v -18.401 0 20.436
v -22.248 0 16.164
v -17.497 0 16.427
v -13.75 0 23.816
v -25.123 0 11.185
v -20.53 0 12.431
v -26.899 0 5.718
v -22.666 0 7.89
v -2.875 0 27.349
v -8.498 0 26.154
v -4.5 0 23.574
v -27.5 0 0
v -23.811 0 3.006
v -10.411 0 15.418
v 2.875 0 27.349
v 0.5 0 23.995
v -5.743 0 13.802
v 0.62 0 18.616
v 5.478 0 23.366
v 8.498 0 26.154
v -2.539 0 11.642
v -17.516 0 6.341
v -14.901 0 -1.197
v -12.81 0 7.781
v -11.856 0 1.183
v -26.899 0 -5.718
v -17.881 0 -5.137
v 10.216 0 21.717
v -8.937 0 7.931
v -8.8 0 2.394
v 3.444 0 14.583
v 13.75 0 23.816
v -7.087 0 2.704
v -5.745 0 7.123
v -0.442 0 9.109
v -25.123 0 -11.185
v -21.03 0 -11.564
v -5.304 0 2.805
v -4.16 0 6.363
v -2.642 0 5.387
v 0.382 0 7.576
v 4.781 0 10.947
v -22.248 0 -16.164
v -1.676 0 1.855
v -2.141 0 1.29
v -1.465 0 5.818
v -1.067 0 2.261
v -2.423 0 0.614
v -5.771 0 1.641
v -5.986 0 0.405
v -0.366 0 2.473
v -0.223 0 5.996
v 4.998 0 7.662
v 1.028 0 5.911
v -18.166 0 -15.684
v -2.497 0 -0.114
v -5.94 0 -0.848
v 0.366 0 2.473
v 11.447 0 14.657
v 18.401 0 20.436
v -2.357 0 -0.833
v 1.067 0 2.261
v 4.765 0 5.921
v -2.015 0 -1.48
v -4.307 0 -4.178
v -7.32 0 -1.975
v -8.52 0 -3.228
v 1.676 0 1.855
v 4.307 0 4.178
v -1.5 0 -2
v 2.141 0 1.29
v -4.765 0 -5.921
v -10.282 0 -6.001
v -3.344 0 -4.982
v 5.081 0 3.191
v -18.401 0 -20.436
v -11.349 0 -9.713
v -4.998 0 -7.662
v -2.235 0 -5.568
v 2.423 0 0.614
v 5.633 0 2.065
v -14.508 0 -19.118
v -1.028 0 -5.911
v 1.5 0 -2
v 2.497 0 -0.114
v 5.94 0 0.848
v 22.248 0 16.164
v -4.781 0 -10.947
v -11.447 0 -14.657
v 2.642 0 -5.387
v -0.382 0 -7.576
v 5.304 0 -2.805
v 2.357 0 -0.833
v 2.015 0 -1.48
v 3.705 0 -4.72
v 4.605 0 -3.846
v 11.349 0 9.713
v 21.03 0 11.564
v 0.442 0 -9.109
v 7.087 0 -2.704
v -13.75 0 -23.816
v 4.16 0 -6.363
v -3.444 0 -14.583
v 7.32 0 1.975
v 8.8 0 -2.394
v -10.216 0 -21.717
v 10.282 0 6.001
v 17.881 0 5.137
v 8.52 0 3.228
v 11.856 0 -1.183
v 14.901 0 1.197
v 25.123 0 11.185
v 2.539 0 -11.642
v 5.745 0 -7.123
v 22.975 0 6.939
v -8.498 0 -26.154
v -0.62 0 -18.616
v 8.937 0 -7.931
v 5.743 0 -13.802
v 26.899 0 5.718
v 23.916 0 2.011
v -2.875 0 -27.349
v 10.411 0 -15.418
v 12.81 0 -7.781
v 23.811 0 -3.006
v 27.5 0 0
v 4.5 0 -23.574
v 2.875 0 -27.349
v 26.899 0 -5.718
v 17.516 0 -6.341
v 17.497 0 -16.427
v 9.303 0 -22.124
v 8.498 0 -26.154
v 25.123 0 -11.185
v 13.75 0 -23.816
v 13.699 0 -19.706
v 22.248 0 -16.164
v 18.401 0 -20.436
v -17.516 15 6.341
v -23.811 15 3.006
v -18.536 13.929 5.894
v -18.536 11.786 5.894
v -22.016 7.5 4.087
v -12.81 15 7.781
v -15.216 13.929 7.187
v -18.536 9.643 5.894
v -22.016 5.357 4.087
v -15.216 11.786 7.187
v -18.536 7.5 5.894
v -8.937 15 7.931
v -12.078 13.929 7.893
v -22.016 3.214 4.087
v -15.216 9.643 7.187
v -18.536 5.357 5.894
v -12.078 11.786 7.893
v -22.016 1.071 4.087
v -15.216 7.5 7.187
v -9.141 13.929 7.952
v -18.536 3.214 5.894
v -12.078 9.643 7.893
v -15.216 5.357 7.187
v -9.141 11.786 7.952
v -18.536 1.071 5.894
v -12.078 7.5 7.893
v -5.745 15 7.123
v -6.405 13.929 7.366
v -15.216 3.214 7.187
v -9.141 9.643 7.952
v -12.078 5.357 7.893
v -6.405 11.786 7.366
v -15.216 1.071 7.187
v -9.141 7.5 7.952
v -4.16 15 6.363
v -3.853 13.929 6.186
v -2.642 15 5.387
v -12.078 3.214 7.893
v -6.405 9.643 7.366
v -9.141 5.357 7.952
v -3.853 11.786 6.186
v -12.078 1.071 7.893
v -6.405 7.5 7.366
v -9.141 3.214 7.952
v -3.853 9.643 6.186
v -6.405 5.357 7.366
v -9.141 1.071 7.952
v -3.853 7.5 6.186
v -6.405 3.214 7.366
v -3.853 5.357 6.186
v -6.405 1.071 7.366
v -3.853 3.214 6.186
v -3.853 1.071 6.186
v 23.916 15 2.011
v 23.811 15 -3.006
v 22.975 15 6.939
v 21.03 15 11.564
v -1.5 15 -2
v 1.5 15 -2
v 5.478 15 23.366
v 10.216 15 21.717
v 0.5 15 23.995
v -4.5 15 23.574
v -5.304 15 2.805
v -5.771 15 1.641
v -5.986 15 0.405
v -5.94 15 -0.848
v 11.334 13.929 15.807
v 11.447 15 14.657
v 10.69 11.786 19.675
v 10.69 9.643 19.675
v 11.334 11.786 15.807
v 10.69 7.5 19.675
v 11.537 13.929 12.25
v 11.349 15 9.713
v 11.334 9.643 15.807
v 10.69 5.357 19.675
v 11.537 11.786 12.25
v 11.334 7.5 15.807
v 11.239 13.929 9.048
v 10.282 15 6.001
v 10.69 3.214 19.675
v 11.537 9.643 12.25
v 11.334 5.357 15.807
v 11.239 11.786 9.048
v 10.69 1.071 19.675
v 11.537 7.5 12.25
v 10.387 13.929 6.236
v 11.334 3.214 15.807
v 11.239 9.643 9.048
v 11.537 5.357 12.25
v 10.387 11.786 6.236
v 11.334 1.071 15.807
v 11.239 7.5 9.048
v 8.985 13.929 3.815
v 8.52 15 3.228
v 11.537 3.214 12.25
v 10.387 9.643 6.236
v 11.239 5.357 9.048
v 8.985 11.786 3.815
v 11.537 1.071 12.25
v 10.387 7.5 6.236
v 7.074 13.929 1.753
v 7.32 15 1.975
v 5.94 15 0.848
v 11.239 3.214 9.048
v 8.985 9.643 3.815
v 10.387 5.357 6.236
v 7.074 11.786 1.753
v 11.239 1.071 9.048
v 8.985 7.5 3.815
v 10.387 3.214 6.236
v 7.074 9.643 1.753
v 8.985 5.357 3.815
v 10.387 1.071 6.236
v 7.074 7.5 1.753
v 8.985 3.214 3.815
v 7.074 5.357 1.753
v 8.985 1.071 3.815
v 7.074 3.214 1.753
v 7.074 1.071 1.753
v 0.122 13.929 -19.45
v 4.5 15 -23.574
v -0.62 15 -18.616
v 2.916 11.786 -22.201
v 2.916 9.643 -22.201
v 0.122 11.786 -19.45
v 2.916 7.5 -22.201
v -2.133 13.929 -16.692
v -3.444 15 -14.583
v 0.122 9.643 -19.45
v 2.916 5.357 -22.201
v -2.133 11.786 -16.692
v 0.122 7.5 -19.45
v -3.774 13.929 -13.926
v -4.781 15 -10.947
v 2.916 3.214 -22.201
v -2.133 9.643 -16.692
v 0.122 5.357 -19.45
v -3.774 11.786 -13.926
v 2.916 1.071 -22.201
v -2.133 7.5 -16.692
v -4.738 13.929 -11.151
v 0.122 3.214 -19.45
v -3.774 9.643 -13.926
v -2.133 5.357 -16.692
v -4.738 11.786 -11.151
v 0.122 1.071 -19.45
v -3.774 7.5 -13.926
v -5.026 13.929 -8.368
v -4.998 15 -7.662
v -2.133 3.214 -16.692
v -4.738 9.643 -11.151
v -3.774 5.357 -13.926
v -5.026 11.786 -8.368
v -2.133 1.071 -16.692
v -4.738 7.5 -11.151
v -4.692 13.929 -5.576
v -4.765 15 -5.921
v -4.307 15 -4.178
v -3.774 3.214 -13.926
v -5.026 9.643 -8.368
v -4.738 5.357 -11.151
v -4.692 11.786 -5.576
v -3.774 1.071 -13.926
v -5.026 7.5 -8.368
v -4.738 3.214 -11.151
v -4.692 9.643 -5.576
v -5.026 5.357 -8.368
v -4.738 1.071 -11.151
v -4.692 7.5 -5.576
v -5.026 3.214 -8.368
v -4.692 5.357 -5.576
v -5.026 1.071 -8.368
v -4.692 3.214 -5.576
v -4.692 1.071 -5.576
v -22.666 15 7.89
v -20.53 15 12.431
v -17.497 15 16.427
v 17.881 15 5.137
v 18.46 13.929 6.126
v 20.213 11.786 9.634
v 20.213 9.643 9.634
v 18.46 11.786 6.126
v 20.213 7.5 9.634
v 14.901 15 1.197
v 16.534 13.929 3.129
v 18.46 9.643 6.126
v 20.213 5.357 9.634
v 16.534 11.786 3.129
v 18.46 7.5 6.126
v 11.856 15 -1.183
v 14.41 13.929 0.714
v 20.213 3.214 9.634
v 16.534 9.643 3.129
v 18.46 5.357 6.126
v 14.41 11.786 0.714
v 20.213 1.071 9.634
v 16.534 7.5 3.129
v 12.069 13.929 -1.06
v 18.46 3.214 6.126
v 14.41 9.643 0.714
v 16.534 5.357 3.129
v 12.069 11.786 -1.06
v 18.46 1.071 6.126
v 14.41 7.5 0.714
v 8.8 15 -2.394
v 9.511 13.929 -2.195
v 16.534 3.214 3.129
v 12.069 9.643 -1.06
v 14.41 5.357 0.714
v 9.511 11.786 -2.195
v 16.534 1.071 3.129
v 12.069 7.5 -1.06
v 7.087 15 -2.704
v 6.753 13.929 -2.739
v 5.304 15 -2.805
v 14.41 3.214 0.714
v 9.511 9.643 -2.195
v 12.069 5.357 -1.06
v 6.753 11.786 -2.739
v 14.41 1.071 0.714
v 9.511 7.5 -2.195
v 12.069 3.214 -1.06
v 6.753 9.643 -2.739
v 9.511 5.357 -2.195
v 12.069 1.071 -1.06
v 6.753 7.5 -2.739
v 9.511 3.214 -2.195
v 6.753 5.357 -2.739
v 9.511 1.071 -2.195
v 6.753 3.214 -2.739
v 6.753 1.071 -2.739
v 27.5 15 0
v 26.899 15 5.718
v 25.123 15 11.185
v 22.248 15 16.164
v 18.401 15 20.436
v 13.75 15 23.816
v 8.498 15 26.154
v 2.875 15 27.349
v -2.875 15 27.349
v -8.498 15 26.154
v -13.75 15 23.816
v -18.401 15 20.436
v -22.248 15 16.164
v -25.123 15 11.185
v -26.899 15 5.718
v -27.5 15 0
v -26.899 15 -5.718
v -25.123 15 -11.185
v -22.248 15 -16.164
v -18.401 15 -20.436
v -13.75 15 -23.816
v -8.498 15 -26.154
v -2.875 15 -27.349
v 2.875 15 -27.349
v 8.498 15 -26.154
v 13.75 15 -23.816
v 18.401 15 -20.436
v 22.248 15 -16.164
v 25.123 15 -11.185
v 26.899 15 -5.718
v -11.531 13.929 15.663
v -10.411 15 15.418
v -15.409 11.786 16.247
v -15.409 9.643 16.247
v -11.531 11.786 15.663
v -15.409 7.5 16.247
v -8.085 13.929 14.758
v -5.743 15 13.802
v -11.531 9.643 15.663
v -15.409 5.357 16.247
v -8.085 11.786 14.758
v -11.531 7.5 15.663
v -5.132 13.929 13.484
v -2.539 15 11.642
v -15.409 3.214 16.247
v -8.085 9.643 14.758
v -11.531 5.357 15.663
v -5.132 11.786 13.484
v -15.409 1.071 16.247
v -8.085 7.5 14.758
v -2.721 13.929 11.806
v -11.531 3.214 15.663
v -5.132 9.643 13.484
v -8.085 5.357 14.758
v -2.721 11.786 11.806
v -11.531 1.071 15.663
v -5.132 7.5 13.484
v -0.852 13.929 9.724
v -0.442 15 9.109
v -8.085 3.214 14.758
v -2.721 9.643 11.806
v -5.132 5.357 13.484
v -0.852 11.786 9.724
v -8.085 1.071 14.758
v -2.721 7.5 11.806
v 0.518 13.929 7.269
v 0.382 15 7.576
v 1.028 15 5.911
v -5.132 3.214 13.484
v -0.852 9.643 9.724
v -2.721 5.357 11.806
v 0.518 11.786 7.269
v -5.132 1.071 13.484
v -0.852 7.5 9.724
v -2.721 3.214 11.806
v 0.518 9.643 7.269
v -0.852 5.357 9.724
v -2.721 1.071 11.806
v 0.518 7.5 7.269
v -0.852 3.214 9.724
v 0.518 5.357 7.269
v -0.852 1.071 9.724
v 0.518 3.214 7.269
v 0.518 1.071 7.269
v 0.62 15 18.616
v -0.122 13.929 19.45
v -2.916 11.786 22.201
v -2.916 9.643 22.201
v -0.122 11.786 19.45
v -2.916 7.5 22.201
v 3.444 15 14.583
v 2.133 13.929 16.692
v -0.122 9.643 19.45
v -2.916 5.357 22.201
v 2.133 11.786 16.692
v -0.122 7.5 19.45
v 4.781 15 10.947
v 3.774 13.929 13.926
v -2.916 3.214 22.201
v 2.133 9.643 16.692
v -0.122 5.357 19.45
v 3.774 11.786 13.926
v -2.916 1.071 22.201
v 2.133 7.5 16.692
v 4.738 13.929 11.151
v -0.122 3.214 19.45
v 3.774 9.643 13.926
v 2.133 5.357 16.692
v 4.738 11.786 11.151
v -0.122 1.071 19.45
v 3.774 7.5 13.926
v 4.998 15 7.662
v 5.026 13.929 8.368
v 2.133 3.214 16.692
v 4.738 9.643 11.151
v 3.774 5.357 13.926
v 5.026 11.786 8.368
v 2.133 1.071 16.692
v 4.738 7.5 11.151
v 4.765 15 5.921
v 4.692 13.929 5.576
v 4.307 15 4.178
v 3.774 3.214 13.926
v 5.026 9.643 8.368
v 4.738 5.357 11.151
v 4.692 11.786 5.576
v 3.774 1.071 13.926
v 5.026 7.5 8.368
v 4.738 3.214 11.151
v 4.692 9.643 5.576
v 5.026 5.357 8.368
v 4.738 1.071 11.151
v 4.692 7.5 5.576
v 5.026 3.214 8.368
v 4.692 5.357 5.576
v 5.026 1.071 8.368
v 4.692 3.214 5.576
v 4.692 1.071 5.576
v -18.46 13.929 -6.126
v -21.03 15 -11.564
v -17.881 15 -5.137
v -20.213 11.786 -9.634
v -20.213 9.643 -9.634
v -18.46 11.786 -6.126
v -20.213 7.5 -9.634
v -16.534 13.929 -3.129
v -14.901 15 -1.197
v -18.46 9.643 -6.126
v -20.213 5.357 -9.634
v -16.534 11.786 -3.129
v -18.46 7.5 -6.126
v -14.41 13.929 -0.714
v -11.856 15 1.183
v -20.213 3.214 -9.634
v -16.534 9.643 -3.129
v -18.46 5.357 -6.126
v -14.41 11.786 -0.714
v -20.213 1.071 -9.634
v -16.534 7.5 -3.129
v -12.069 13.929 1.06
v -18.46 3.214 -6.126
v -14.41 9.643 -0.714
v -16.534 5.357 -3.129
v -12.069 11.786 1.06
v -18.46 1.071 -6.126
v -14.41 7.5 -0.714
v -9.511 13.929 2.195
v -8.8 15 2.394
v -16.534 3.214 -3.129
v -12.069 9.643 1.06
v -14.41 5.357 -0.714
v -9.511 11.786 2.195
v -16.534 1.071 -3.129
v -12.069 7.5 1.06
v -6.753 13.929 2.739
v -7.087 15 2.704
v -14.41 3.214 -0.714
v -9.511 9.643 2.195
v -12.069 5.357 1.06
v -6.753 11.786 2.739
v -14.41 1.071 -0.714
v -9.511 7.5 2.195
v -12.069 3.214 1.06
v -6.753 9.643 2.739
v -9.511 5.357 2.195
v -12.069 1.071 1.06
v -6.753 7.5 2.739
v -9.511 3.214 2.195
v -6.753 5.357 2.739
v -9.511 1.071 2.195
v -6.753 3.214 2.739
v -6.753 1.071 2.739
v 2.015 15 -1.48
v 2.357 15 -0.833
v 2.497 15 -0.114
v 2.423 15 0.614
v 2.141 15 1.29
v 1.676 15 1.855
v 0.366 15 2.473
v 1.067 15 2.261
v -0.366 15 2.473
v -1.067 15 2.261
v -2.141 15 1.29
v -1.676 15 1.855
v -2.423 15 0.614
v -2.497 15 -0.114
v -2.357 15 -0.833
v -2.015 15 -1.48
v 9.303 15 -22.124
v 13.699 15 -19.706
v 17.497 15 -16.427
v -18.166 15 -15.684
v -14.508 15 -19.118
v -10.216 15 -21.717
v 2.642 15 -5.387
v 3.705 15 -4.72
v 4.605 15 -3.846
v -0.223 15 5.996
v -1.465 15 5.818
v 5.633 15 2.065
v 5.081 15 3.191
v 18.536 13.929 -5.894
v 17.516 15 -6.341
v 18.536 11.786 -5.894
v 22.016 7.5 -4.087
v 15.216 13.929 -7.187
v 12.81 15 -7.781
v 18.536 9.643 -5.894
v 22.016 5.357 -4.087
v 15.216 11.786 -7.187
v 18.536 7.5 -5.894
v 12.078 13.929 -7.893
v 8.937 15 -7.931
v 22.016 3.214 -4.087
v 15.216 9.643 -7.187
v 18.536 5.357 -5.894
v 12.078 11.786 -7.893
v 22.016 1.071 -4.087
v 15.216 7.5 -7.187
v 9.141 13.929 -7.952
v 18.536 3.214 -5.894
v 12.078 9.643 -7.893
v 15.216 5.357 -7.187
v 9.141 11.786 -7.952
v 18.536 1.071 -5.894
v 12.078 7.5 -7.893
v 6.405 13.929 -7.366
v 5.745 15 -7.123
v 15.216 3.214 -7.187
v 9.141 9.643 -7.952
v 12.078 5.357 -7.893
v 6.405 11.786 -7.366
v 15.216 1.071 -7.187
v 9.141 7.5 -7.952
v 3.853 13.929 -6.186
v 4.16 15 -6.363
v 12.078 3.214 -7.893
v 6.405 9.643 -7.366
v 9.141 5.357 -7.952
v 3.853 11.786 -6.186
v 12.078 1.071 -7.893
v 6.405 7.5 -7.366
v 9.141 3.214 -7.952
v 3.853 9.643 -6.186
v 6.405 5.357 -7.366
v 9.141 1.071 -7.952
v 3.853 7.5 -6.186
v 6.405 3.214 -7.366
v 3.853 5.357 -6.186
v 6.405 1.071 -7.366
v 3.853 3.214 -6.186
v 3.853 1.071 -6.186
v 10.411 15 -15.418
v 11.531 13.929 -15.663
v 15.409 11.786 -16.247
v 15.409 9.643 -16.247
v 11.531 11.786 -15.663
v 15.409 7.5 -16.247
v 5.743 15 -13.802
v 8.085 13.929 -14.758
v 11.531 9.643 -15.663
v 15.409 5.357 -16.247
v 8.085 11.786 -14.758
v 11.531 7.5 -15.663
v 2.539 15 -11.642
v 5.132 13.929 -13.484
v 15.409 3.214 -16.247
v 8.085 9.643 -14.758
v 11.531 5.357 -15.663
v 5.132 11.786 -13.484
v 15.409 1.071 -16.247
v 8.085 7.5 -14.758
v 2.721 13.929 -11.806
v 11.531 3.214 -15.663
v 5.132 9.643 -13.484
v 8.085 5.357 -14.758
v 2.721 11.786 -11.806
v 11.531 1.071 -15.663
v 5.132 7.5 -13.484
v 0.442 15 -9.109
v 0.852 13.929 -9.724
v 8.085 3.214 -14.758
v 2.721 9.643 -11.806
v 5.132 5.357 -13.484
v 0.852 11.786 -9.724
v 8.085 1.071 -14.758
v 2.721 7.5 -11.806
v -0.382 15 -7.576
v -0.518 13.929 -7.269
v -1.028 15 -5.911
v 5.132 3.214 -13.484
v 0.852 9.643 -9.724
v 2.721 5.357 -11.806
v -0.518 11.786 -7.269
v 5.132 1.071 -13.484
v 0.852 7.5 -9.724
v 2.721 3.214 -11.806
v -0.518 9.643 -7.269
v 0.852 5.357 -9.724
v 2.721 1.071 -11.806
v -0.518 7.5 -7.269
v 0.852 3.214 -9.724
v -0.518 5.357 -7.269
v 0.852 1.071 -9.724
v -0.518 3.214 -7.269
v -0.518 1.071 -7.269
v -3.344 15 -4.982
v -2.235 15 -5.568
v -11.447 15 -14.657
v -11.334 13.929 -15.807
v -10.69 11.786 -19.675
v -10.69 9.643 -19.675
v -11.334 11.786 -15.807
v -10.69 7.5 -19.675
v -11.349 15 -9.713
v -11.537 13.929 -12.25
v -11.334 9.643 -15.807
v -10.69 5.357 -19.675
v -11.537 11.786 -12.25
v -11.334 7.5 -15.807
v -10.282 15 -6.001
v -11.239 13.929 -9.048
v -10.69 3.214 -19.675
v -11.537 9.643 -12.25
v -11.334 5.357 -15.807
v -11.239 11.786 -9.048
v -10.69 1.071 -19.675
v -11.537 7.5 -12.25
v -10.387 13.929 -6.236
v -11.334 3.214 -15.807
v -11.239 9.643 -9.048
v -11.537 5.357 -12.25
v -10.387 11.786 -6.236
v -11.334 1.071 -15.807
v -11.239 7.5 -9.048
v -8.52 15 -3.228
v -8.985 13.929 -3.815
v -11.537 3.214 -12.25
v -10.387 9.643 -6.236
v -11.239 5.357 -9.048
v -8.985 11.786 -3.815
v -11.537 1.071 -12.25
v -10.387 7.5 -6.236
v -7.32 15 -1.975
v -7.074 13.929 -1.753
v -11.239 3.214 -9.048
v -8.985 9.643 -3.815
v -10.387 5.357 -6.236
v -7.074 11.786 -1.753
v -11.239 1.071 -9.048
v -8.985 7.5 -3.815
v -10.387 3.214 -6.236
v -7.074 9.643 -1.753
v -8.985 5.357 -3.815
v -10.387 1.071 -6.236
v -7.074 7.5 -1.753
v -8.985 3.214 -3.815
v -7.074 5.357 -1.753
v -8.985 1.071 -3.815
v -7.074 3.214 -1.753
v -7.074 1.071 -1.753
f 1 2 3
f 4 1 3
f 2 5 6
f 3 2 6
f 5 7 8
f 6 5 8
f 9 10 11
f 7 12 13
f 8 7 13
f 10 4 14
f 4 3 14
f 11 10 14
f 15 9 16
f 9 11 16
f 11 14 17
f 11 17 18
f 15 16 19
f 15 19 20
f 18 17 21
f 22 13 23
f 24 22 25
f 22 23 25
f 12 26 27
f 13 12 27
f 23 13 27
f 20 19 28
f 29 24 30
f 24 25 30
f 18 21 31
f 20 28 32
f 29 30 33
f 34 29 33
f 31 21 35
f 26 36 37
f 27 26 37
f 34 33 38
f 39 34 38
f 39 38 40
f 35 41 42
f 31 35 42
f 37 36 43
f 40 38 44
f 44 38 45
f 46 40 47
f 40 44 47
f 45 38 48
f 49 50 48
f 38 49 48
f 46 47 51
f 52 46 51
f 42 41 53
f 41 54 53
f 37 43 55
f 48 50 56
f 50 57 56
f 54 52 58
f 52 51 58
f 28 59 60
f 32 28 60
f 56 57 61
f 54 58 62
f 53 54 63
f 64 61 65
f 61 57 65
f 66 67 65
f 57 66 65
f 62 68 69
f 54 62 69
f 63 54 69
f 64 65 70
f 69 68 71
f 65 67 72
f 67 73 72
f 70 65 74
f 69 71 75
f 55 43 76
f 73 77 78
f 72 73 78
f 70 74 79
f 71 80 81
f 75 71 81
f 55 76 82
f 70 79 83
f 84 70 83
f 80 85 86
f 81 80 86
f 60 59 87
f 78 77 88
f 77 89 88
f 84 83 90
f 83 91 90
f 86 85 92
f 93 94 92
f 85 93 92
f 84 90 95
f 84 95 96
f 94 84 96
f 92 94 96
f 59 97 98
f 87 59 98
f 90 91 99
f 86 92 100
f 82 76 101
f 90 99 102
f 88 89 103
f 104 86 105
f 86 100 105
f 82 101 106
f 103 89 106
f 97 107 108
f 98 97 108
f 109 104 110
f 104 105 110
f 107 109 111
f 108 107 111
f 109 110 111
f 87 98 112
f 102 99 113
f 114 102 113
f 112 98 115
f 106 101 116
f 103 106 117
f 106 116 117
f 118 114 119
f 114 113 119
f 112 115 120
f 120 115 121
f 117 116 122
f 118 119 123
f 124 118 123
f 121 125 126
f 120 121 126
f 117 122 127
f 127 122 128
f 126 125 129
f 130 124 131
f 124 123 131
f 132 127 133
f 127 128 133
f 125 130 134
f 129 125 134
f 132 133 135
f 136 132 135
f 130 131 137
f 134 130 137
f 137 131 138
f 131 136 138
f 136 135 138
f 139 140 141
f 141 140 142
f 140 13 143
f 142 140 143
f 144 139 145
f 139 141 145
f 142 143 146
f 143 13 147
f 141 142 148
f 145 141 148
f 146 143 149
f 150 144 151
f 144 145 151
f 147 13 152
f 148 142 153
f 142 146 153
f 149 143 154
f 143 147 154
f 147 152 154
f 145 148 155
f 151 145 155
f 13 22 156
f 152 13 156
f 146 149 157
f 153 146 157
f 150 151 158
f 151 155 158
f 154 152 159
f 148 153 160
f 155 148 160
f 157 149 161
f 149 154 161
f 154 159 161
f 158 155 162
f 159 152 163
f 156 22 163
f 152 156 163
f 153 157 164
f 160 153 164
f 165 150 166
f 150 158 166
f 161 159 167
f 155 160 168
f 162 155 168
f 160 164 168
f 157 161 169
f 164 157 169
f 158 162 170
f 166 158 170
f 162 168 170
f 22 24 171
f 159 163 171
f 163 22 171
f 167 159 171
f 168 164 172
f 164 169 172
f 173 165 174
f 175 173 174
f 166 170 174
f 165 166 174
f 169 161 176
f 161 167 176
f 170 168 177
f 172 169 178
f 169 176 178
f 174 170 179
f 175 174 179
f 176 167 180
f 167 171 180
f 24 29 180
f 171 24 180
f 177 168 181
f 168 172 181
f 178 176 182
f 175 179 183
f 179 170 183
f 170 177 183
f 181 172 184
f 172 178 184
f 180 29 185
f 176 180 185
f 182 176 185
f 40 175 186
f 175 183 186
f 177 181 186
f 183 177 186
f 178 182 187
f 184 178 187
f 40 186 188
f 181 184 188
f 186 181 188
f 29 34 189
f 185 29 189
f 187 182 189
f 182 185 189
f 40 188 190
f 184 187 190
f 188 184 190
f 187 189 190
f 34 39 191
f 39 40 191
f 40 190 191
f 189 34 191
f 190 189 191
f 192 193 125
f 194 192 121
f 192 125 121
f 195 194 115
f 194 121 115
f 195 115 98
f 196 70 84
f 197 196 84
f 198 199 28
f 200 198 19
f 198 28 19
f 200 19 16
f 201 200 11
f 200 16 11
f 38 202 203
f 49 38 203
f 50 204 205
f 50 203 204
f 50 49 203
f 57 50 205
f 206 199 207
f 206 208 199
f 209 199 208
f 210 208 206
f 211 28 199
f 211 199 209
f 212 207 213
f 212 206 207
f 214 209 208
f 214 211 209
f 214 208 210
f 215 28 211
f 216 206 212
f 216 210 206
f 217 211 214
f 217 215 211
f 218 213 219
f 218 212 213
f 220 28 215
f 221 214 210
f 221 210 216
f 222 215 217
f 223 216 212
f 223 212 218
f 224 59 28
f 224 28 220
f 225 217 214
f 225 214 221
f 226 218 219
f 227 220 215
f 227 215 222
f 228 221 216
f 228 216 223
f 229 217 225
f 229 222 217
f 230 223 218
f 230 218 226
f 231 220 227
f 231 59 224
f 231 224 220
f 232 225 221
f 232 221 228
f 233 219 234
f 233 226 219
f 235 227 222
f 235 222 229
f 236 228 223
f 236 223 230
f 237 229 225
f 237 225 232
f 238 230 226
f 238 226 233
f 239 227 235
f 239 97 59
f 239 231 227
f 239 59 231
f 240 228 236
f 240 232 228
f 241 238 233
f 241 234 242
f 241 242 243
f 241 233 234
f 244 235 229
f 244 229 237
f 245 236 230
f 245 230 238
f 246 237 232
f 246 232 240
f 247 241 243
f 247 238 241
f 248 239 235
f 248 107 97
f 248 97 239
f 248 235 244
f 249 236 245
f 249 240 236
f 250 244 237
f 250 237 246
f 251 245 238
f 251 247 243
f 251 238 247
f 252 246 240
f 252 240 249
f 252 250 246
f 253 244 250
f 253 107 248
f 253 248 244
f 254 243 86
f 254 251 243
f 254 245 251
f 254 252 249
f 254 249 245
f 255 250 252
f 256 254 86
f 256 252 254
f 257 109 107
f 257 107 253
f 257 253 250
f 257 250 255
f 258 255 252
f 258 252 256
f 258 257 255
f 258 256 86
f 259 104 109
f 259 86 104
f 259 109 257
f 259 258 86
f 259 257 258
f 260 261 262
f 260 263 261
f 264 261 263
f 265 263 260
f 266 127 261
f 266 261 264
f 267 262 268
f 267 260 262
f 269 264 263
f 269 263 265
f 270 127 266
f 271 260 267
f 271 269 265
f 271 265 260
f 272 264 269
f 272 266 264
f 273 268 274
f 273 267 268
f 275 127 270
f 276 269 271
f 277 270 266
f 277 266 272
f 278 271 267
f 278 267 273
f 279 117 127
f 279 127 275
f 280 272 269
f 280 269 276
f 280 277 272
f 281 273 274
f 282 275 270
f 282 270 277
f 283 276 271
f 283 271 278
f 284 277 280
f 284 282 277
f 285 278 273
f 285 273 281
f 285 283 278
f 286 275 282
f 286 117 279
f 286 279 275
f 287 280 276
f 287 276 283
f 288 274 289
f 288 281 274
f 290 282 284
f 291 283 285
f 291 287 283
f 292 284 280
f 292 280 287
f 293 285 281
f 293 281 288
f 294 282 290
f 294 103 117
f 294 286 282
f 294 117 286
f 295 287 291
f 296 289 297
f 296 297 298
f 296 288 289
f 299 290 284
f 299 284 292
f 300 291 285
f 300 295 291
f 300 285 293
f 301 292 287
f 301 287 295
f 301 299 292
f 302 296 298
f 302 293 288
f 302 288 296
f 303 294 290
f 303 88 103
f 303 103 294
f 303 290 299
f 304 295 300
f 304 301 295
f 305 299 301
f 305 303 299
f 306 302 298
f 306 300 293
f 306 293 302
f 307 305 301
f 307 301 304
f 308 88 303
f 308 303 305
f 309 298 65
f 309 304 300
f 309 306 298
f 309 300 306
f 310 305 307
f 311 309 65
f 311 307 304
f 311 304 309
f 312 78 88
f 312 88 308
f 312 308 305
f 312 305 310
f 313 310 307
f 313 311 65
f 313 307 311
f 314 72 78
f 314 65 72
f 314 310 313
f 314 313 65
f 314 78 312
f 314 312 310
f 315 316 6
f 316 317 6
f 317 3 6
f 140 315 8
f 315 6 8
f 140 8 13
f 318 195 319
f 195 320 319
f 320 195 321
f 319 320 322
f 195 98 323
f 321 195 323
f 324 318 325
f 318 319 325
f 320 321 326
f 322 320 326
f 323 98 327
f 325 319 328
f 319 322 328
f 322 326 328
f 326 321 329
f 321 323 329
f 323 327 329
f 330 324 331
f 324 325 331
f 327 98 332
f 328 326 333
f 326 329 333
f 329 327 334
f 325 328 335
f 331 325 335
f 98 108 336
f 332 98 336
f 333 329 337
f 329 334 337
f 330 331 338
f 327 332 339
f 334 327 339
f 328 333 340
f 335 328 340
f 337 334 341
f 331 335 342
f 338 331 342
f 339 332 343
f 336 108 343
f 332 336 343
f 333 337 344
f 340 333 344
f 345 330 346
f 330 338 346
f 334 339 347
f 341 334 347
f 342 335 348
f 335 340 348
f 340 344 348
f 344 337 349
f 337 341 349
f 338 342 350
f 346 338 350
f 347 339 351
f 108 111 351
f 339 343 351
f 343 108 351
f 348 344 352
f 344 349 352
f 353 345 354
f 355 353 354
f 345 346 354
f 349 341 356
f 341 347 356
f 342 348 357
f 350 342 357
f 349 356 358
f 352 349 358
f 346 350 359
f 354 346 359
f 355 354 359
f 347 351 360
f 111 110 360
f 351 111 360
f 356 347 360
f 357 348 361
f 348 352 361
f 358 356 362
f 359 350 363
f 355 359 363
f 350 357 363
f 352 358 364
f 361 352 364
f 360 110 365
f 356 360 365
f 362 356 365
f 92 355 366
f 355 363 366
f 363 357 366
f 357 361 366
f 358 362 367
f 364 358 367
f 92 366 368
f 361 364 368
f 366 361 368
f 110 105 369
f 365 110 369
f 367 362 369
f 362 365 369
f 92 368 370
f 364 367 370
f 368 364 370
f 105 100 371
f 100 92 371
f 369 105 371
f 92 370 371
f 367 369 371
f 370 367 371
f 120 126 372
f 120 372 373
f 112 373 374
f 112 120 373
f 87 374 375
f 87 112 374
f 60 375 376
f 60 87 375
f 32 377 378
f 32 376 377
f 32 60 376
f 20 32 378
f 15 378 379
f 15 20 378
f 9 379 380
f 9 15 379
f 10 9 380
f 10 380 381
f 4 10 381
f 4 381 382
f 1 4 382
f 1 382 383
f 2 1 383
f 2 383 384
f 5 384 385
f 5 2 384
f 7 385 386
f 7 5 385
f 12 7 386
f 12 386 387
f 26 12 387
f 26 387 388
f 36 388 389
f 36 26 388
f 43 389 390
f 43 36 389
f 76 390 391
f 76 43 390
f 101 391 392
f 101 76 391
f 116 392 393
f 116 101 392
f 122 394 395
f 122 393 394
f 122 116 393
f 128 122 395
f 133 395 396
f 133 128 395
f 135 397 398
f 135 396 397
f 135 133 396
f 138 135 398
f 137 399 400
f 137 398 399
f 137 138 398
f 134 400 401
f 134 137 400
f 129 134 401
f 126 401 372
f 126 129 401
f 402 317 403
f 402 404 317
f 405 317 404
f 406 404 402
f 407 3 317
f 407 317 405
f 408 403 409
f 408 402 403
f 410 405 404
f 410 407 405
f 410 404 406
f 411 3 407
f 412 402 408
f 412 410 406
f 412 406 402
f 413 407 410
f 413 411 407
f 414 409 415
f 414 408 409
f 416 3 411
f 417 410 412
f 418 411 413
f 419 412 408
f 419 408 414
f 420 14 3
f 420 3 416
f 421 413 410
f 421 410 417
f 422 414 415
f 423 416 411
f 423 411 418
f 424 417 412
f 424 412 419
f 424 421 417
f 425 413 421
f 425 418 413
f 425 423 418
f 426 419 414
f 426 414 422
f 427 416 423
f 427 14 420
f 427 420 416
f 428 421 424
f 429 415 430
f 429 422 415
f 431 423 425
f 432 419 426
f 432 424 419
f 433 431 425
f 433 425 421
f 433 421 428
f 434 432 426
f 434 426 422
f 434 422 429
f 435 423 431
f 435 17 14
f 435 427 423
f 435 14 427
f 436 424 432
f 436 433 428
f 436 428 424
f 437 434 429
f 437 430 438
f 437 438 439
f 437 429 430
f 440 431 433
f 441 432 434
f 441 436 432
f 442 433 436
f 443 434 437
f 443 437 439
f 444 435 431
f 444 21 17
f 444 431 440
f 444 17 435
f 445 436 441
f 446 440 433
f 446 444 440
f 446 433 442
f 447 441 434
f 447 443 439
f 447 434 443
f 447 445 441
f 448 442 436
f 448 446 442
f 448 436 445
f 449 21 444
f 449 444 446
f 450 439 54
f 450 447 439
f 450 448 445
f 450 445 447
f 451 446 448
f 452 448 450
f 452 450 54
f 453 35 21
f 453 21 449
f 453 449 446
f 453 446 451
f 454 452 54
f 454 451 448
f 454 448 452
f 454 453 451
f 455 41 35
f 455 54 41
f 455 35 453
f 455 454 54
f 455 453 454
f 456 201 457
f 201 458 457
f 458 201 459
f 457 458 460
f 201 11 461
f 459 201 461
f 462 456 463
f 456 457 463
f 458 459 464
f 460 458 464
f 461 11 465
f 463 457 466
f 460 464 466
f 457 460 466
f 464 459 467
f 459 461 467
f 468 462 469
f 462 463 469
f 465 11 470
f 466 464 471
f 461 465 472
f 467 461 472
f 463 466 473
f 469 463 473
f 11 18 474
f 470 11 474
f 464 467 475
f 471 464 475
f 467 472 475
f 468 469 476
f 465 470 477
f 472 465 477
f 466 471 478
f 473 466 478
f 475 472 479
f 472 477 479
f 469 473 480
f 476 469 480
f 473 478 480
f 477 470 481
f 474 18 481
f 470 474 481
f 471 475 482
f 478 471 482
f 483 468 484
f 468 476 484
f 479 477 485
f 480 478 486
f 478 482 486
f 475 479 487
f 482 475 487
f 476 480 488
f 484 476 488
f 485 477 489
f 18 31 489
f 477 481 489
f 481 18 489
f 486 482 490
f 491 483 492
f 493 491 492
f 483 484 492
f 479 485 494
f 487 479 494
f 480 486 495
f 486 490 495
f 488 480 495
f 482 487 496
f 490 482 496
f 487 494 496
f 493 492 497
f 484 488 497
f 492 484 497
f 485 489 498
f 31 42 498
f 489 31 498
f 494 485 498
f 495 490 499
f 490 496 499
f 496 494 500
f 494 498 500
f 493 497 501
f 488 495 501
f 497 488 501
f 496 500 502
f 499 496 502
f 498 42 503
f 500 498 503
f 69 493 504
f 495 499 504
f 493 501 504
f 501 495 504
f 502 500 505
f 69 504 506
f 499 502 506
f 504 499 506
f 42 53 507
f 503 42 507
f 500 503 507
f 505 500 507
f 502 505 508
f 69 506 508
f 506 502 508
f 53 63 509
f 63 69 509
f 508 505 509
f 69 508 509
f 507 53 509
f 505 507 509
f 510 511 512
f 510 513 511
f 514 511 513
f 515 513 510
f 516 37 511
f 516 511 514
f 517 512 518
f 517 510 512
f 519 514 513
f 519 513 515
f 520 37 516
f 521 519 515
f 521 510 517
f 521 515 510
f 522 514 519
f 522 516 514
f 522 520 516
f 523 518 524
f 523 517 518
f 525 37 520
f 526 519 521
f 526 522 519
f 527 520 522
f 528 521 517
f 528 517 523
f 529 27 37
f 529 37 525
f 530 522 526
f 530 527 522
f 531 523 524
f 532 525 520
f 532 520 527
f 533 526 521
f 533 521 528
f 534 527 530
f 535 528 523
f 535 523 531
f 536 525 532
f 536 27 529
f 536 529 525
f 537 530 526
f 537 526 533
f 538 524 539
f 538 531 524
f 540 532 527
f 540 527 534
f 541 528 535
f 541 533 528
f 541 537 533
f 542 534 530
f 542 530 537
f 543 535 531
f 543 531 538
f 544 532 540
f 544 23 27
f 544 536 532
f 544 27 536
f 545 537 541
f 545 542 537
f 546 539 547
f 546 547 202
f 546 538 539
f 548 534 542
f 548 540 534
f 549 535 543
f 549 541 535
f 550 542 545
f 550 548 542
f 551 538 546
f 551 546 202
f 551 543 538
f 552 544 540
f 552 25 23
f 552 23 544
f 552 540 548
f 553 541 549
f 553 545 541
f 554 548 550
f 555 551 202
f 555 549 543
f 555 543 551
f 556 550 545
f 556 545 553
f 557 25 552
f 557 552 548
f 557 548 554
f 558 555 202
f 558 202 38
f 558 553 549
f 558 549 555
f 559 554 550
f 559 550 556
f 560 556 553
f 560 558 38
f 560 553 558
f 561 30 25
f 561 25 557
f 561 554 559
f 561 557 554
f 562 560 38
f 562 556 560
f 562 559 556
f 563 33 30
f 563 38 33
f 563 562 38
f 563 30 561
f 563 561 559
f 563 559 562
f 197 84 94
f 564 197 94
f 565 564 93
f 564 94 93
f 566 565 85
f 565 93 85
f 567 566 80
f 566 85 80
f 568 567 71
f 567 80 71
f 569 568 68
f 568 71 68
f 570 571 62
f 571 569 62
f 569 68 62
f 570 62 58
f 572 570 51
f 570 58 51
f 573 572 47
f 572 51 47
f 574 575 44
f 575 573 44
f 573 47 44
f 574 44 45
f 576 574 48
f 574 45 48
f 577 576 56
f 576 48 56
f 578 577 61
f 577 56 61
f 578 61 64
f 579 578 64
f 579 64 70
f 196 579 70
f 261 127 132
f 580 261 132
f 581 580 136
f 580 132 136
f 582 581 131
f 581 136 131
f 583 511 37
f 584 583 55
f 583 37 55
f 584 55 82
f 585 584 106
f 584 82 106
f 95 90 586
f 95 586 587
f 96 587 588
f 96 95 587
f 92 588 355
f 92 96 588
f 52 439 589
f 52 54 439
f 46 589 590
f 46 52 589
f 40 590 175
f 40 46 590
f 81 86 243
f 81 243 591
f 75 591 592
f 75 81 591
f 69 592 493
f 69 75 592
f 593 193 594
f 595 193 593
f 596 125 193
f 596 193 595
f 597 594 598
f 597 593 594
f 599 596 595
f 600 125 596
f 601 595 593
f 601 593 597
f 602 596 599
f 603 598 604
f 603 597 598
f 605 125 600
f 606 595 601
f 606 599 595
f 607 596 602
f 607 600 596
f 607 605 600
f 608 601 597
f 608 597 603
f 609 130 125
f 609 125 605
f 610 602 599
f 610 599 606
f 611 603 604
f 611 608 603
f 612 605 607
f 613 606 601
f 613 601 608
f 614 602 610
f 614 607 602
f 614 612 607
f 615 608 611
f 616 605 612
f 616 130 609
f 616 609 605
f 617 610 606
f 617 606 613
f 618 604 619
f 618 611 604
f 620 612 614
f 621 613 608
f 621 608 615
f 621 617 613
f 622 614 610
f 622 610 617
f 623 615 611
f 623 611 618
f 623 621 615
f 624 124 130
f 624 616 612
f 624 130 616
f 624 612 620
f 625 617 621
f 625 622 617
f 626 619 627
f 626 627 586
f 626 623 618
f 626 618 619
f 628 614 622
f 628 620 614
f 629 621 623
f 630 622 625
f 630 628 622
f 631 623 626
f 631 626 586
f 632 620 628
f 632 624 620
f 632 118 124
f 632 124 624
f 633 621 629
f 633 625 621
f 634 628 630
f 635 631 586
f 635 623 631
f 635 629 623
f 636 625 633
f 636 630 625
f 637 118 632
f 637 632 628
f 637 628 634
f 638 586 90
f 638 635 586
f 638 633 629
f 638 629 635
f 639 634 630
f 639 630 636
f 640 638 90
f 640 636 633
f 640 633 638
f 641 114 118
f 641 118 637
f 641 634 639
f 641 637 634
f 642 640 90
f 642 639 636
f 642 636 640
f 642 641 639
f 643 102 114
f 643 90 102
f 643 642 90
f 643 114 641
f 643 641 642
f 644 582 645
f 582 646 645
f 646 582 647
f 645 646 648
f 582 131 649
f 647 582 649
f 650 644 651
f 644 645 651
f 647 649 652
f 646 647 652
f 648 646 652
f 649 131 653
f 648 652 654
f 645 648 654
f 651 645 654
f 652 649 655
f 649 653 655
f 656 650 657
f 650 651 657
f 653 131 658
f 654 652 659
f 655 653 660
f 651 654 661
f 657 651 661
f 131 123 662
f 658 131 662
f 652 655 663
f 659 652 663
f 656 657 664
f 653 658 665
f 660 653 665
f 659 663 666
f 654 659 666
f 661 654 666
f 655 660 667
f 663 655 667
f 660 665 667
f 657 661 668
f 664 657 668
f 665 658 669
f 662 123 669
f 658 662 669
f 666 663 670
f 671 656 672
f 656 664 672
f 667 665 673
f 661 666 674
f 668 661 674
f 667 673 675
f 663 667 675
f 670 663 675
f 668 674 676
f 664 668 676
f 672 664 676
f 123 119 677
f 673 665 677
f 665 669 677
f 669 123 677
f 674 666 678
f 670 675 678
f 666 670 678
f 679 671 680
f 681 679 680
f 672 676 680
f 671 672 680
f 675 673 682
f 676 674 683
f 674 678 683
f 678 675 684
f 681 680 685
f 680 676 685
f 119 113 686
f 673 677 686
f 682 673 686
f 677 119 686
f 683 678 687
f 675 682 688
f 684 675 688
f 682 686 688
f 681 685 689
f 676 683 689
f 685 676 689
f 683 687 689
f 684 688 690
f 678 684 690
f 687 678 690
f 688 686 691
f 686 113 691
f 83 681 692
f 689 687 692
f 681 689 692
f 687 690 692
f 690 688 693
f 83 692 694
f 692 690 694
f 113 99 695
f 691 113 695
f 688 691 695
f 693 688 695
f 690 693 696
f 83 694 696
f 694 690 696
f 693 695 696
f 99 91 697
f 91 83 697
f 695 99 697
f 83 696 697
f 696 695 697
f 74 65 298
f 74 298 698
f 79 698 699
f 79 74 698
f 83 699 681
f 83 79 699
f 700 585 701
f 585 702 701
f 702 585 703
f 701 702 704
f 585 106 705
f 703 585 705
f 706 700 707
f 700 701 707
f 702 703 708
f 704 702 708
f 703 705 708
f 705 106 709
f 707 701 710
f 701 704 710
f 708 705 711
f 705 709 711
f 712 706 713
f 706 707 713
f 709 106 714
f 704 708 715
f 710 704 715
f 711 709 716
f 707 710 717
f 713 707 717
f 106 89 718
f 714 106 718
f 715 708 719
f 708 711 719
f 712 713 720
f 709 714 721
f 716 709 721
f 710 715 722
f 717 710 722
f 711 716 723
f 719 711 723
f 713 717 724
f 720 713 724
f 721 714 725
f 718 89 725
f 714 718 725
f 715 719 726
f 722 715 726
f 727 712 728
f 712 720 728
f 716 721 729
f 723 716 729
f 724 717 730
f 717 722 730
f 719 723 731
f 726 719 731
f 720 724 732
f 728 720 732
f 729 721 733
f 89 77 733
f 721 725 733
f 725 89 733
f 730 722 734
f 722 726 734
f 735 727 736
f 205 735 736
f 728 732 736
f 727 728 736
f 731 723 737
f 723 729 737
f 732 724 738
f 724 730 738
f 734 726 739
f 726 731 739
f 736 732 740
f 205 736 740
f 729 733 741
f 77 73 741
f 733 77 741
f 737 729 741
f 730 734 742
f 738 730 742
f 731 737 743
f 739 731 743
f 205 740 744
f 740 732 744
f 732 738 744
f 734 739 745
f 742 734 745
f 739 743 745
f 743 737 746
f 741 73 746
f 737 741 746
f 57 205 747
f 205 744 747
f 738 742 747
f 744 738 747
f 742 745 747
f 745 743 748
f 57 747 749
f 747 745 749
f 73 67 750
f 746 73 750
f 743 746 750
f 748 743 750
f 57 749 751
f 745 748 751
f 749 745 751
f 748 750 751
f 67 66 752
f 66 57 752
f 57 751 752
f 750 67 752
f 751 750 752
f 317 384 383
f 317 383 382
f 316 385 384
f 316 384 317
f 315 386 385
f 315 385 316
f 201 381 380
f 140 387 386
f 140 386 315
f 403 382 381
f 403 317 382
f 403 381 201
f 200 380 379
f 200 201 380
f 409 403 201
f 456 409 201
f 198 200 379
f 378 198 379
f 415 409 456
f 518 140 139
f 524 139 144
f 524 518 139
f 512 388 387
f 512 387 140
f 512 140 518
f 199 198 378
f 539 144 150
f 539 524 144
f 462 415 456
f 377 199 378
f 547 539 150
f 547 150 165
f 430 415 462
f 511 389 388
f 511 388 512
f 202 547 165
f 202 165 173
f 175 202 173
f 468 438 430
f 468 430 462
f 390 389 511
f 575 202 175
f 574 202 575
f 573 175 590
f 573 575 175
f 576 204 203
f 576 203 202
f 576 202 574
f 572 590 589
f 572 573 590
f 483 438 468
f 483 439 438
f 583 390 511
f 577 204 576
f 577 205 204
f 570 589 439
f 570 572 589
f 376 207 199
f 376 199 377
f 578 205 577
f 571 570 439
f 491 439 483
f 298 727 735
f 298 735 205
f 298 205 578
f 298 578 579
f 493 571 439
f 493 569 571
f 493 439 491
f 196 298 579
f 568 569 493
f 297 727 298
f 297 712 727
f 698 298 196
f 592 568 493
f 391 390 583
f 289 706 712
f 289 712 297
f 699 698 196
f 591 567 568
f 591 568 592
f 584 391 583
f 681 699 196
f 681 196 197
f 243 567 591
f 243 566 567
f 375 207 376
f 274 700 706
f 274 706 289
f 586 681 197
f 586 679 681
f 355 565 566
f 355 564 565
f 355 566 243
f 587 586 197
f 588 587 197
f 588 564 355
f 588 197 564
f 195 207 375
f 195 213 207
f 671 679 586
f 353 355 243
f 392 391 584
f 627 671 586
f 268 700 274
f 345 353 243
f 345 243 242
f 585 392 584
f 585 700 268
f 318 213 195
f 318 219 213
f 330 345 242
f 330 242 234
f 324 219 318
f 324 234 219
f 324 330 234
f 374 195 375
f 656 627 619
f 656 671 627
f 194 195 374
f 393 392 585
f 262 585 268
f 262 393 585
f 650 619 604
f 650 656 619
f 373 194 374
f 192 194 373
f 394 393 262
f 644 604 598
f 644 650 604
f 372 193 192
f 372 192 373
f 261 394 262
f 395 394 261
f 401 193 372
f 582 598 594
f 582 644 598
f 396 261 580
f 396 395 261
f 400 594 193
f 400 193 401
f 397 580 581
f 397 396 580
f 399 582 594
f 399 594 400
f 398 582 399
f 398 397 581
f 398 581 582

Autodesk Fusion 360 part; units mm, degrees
sketch "Sketch1" plane through (0, 0, 0) normal (0, 1, 0) x (1, 0, 0)
  circle A0 centre (0, 0) radius 2.5
  circle A1 centre (0, 0) radius 27.5
  circle A2 centre (0, 0) radius 6
  circle A3 centre (0, 0) radius 24
  line L0 (0, 0) -> (0, 2.5)
  line L1 (-1.5, 2) -> (1.5, 2)
  line L2 (1.5, 2) -> (1.5, -2)
  line L3 (1.5, -2) -> (-1.5, -2)
  line L4 (-1.5, -2) -> (-1.5, 2)
  line L5 (0, 0) -> (0, -2.5)
  spline S0 degree 5 poles (-10.2165, 21.7169) (-10.3629, 21.1355) (-10.6365, 19.9863) (-10.9889, 18.3035) (-11.3409, 16.1432) (-11.5701, 13.5918) (-11.567, 11.2048) (-11.3076, 8.9989) (-10.7716, 6.9887) (-9.9564, 5.1759) (-8.8773, 3.5497) (-7.8173, 2.3879) (-6.9183, 1.5901) (-6.2735, 1.0903) (-5.9397, 0.8485) knots 0 0 0 0 0 0 0.1 0.2 0.3 0.4 0.5 0.6 0.7 0.8 0.9 1 1 1 1 1 1
  spline S1 degree 5 poles (-21.0302, 11.5643) (-20.8069, 11.0078) (-20.3528, 9.9173) (-19.6488, 8.3487) (-18.6637, 6.3941) (-17.3495, 4.1953) (-15.9439, 2.2659) (-14.4375, 0.6338) (-12.8223, -0.6775) (-11.0972, -1.6649) (-9.2683, -2.3461) (-7.7279, -2.6631) (-6.5316, -2.7801) (-5.7162, -2.8054) (-5.3041, -2.8048) knots 0 0 0 0 0 0 0.1 0.2 0.3 0.4 0.5 0.6 0.7 0.8 0.9 1 1 1 1 1 1
  spline S2 degree 5 poles (-23.8111, -3.0055) (-23.3034, -3.3245) (-22.295, -3.9398) (-20.8034, -4.795) (-18.8576, -5.7973) (-16.502, -6.8037) (-14.2308, -7.5384) (-12.0527, -7.9734) (-9.9752, -8.0848) (-7.9993, -7.8697) (-6.1192, -7.3459) (-4.6867, -6.6968) (-3.6501, -6.0883) (-2.9756, -5.6295) (-2.6425, -5.3868) knots 0 0 0 0 0 0 0.1 0.2 0.3 0.4 0.5 0.6 0.7 0.8 0.9 1 1 1 1 1 1
  spline S3 degree 5 poles (-17.4969, -16.4273) (-16.8987, -16.3869) (-15.7212, -16.292) (-14.0119, -16.1072) (-11.8486, -15.7743) (-9.3513, -15.2039) (-7.082, -14.4633) (-5.0642, -13.535) (-3.318, -12.4041) (-1.8458, -11.0686) (-0.6328, -9.5397) (0.1447, -8.1726) (0.6256, -7.0711) (0.9016, -6.3034) (1.0285, -5.9112) knots 0 0 0 0 0 0 0.1 0.2 0.3 0.4 0.5 0.6 0.7 0.8 0.9 1 1 1 1 1 1
  spline S4 degree 5 poles (-4.4996, -23.5744) (-4.0393, -23.1901) (-3.1425, -22.4212) (-1.8683, -21.267) (-0.3138, -19.7261) (1.3713, -17.7968) (2.7719, -15.8637) (3.8587, -13.9267) (4.6066, -11.9854) (5.0126, -10.0396) (5.0954, -8.0897) (4.9208, -6.5267) (4.6624, -5.3529) (4.4345, -4.5696) (4.3066, -4.1777) knots 0 0 0 0 0 0 0.1 0.2 0.3 0.4 0.5 0.6 0.7 0.8 0.9 1 1 1 1 1 1
  spline S5 degree 5 poles (10.2165, -21.7169) (10.3629, -21.1355) (10.6365, -19.9863) (10.9889, -18.3035) (11.3409, -16.1432) (11.5701, -13.5918) (11.567, -11.2048) (11.3076, -8.9989) (10.7716, -6.9887) (9.9564, -5.1759) (8.8773, -3.5497) (7.8173, -2.3879) (6.9183, -1.5901) (6.2735, -1.0903) (5.9397, -0.8485) knots 0 0 0 0 0 0 0.1 0.2 0.3 0.4 0.5 0.6 0.7 0.8 0.9 1 1 1 1 1 1
  spline S6 degree 5 poles (21.0302, -11.5643) (20.8069, -11.0078) (20.3528, -9.9173) (19.6488, -8.3487) (18.6637, -6.3941) (17.3495, -4.1953) (15.9439, -2.2659) (14.4375, -0.6338) (12.8223, 0.6775) (11.0972, 1.6649) (9.2683, 2.3461) (7.7279, 2.6631) (6.5316, 2.7801) (5.7162, 2.8054) (5.3041, 2.8048) knots 0 0 0 0 0 0 0.1 0.2 0.3 0.4 0.5 0.6 0.7 0.8 0.9 1 1 1 1 1 1
  spline S7 degree 5 poles (23.8111, 3.0055) (23.3034, 3.3245) (22.295, 3.9398) (20.8034, 4.795) (18.8576, 5.7973) (16.502, 6.8037) (14.2308, 7.5384) (12.0527, 7.9734) (9.9752, 8.0848) (7.9993, 7.8697) (6.1192, 7.3459) (4.6867, 6.6968) (3.6501, 6.0883) (2.9756, 5.6295) (2.6425, 5.3868) knots 0 0 0 0 0 0 0.1 0.2 0.3 0.4 0.5 0.6 0.7 0.8 0.9 1 1 1 1 1 1
  spline S8 degree 5 poles (17.4969, 16.4273) (16.8987, 16.3869) (15.7212, 16.292) (14.0119, 16.1072) (11.8486, 15.7743) (9.3513, 15.2039) (7.082, 14.4633) (5.0642, 13.535) (3.318, 12.4041) (1.8458, 11.0686) (0.6328, 9.5397) (-0.1447, 8.1726) (-0.6256, 7.0711) (-0.9016, 6.3034) (-1.0285, 5.9112) knots 0 0 0 0 0 0 0.1 0.2 0.3 0.4 0.5 0.6 0.7 0.8 0.9 1 1 1 1 1 1
  spline S9 degree 5 poles (4.4996, 23.5744) (4.0393, 23.1901) (3.1425, 22.4212) (1.8683, 21.267) (0.3138, 19.7261) (-1.3713, 17.7968) (-2.7719, 15.8637) (-3.8587, 13.9267) (-4.6066, 11.9854) (-5.0126, 10.0396) (-5.0954, 8.0897) (-4.9208, 6.5267) (-4.6624, 5.3529) (-4.4345, 4.5696) (-4.3066, 4.1777) knots 0 0 0 0 0 0 0.1 0.2 0.3 0.4 0.5 0.6 0.7 0.8 0.9 1 1 1 1 1 1
  dimension "d1" = 5
  dimension "d2" = 55
  dimension "d3" = 12
  dimension "d4" = 48
  dimension "d5" = 0.5
  dimension "d6" = 0.5
  dimension "d8" = 360
extrude "Extrude1" add sketch "Sketch1" along normal blind 15 contours A0 L0 L1 | A0 L0 L1 | A1 | A2 | A2 A3 S5 S6 | A2 A3 S7 S8 | A2 A3 S3 S4 | A2 A3 S0 S9 | A2 A3 S1 S2
